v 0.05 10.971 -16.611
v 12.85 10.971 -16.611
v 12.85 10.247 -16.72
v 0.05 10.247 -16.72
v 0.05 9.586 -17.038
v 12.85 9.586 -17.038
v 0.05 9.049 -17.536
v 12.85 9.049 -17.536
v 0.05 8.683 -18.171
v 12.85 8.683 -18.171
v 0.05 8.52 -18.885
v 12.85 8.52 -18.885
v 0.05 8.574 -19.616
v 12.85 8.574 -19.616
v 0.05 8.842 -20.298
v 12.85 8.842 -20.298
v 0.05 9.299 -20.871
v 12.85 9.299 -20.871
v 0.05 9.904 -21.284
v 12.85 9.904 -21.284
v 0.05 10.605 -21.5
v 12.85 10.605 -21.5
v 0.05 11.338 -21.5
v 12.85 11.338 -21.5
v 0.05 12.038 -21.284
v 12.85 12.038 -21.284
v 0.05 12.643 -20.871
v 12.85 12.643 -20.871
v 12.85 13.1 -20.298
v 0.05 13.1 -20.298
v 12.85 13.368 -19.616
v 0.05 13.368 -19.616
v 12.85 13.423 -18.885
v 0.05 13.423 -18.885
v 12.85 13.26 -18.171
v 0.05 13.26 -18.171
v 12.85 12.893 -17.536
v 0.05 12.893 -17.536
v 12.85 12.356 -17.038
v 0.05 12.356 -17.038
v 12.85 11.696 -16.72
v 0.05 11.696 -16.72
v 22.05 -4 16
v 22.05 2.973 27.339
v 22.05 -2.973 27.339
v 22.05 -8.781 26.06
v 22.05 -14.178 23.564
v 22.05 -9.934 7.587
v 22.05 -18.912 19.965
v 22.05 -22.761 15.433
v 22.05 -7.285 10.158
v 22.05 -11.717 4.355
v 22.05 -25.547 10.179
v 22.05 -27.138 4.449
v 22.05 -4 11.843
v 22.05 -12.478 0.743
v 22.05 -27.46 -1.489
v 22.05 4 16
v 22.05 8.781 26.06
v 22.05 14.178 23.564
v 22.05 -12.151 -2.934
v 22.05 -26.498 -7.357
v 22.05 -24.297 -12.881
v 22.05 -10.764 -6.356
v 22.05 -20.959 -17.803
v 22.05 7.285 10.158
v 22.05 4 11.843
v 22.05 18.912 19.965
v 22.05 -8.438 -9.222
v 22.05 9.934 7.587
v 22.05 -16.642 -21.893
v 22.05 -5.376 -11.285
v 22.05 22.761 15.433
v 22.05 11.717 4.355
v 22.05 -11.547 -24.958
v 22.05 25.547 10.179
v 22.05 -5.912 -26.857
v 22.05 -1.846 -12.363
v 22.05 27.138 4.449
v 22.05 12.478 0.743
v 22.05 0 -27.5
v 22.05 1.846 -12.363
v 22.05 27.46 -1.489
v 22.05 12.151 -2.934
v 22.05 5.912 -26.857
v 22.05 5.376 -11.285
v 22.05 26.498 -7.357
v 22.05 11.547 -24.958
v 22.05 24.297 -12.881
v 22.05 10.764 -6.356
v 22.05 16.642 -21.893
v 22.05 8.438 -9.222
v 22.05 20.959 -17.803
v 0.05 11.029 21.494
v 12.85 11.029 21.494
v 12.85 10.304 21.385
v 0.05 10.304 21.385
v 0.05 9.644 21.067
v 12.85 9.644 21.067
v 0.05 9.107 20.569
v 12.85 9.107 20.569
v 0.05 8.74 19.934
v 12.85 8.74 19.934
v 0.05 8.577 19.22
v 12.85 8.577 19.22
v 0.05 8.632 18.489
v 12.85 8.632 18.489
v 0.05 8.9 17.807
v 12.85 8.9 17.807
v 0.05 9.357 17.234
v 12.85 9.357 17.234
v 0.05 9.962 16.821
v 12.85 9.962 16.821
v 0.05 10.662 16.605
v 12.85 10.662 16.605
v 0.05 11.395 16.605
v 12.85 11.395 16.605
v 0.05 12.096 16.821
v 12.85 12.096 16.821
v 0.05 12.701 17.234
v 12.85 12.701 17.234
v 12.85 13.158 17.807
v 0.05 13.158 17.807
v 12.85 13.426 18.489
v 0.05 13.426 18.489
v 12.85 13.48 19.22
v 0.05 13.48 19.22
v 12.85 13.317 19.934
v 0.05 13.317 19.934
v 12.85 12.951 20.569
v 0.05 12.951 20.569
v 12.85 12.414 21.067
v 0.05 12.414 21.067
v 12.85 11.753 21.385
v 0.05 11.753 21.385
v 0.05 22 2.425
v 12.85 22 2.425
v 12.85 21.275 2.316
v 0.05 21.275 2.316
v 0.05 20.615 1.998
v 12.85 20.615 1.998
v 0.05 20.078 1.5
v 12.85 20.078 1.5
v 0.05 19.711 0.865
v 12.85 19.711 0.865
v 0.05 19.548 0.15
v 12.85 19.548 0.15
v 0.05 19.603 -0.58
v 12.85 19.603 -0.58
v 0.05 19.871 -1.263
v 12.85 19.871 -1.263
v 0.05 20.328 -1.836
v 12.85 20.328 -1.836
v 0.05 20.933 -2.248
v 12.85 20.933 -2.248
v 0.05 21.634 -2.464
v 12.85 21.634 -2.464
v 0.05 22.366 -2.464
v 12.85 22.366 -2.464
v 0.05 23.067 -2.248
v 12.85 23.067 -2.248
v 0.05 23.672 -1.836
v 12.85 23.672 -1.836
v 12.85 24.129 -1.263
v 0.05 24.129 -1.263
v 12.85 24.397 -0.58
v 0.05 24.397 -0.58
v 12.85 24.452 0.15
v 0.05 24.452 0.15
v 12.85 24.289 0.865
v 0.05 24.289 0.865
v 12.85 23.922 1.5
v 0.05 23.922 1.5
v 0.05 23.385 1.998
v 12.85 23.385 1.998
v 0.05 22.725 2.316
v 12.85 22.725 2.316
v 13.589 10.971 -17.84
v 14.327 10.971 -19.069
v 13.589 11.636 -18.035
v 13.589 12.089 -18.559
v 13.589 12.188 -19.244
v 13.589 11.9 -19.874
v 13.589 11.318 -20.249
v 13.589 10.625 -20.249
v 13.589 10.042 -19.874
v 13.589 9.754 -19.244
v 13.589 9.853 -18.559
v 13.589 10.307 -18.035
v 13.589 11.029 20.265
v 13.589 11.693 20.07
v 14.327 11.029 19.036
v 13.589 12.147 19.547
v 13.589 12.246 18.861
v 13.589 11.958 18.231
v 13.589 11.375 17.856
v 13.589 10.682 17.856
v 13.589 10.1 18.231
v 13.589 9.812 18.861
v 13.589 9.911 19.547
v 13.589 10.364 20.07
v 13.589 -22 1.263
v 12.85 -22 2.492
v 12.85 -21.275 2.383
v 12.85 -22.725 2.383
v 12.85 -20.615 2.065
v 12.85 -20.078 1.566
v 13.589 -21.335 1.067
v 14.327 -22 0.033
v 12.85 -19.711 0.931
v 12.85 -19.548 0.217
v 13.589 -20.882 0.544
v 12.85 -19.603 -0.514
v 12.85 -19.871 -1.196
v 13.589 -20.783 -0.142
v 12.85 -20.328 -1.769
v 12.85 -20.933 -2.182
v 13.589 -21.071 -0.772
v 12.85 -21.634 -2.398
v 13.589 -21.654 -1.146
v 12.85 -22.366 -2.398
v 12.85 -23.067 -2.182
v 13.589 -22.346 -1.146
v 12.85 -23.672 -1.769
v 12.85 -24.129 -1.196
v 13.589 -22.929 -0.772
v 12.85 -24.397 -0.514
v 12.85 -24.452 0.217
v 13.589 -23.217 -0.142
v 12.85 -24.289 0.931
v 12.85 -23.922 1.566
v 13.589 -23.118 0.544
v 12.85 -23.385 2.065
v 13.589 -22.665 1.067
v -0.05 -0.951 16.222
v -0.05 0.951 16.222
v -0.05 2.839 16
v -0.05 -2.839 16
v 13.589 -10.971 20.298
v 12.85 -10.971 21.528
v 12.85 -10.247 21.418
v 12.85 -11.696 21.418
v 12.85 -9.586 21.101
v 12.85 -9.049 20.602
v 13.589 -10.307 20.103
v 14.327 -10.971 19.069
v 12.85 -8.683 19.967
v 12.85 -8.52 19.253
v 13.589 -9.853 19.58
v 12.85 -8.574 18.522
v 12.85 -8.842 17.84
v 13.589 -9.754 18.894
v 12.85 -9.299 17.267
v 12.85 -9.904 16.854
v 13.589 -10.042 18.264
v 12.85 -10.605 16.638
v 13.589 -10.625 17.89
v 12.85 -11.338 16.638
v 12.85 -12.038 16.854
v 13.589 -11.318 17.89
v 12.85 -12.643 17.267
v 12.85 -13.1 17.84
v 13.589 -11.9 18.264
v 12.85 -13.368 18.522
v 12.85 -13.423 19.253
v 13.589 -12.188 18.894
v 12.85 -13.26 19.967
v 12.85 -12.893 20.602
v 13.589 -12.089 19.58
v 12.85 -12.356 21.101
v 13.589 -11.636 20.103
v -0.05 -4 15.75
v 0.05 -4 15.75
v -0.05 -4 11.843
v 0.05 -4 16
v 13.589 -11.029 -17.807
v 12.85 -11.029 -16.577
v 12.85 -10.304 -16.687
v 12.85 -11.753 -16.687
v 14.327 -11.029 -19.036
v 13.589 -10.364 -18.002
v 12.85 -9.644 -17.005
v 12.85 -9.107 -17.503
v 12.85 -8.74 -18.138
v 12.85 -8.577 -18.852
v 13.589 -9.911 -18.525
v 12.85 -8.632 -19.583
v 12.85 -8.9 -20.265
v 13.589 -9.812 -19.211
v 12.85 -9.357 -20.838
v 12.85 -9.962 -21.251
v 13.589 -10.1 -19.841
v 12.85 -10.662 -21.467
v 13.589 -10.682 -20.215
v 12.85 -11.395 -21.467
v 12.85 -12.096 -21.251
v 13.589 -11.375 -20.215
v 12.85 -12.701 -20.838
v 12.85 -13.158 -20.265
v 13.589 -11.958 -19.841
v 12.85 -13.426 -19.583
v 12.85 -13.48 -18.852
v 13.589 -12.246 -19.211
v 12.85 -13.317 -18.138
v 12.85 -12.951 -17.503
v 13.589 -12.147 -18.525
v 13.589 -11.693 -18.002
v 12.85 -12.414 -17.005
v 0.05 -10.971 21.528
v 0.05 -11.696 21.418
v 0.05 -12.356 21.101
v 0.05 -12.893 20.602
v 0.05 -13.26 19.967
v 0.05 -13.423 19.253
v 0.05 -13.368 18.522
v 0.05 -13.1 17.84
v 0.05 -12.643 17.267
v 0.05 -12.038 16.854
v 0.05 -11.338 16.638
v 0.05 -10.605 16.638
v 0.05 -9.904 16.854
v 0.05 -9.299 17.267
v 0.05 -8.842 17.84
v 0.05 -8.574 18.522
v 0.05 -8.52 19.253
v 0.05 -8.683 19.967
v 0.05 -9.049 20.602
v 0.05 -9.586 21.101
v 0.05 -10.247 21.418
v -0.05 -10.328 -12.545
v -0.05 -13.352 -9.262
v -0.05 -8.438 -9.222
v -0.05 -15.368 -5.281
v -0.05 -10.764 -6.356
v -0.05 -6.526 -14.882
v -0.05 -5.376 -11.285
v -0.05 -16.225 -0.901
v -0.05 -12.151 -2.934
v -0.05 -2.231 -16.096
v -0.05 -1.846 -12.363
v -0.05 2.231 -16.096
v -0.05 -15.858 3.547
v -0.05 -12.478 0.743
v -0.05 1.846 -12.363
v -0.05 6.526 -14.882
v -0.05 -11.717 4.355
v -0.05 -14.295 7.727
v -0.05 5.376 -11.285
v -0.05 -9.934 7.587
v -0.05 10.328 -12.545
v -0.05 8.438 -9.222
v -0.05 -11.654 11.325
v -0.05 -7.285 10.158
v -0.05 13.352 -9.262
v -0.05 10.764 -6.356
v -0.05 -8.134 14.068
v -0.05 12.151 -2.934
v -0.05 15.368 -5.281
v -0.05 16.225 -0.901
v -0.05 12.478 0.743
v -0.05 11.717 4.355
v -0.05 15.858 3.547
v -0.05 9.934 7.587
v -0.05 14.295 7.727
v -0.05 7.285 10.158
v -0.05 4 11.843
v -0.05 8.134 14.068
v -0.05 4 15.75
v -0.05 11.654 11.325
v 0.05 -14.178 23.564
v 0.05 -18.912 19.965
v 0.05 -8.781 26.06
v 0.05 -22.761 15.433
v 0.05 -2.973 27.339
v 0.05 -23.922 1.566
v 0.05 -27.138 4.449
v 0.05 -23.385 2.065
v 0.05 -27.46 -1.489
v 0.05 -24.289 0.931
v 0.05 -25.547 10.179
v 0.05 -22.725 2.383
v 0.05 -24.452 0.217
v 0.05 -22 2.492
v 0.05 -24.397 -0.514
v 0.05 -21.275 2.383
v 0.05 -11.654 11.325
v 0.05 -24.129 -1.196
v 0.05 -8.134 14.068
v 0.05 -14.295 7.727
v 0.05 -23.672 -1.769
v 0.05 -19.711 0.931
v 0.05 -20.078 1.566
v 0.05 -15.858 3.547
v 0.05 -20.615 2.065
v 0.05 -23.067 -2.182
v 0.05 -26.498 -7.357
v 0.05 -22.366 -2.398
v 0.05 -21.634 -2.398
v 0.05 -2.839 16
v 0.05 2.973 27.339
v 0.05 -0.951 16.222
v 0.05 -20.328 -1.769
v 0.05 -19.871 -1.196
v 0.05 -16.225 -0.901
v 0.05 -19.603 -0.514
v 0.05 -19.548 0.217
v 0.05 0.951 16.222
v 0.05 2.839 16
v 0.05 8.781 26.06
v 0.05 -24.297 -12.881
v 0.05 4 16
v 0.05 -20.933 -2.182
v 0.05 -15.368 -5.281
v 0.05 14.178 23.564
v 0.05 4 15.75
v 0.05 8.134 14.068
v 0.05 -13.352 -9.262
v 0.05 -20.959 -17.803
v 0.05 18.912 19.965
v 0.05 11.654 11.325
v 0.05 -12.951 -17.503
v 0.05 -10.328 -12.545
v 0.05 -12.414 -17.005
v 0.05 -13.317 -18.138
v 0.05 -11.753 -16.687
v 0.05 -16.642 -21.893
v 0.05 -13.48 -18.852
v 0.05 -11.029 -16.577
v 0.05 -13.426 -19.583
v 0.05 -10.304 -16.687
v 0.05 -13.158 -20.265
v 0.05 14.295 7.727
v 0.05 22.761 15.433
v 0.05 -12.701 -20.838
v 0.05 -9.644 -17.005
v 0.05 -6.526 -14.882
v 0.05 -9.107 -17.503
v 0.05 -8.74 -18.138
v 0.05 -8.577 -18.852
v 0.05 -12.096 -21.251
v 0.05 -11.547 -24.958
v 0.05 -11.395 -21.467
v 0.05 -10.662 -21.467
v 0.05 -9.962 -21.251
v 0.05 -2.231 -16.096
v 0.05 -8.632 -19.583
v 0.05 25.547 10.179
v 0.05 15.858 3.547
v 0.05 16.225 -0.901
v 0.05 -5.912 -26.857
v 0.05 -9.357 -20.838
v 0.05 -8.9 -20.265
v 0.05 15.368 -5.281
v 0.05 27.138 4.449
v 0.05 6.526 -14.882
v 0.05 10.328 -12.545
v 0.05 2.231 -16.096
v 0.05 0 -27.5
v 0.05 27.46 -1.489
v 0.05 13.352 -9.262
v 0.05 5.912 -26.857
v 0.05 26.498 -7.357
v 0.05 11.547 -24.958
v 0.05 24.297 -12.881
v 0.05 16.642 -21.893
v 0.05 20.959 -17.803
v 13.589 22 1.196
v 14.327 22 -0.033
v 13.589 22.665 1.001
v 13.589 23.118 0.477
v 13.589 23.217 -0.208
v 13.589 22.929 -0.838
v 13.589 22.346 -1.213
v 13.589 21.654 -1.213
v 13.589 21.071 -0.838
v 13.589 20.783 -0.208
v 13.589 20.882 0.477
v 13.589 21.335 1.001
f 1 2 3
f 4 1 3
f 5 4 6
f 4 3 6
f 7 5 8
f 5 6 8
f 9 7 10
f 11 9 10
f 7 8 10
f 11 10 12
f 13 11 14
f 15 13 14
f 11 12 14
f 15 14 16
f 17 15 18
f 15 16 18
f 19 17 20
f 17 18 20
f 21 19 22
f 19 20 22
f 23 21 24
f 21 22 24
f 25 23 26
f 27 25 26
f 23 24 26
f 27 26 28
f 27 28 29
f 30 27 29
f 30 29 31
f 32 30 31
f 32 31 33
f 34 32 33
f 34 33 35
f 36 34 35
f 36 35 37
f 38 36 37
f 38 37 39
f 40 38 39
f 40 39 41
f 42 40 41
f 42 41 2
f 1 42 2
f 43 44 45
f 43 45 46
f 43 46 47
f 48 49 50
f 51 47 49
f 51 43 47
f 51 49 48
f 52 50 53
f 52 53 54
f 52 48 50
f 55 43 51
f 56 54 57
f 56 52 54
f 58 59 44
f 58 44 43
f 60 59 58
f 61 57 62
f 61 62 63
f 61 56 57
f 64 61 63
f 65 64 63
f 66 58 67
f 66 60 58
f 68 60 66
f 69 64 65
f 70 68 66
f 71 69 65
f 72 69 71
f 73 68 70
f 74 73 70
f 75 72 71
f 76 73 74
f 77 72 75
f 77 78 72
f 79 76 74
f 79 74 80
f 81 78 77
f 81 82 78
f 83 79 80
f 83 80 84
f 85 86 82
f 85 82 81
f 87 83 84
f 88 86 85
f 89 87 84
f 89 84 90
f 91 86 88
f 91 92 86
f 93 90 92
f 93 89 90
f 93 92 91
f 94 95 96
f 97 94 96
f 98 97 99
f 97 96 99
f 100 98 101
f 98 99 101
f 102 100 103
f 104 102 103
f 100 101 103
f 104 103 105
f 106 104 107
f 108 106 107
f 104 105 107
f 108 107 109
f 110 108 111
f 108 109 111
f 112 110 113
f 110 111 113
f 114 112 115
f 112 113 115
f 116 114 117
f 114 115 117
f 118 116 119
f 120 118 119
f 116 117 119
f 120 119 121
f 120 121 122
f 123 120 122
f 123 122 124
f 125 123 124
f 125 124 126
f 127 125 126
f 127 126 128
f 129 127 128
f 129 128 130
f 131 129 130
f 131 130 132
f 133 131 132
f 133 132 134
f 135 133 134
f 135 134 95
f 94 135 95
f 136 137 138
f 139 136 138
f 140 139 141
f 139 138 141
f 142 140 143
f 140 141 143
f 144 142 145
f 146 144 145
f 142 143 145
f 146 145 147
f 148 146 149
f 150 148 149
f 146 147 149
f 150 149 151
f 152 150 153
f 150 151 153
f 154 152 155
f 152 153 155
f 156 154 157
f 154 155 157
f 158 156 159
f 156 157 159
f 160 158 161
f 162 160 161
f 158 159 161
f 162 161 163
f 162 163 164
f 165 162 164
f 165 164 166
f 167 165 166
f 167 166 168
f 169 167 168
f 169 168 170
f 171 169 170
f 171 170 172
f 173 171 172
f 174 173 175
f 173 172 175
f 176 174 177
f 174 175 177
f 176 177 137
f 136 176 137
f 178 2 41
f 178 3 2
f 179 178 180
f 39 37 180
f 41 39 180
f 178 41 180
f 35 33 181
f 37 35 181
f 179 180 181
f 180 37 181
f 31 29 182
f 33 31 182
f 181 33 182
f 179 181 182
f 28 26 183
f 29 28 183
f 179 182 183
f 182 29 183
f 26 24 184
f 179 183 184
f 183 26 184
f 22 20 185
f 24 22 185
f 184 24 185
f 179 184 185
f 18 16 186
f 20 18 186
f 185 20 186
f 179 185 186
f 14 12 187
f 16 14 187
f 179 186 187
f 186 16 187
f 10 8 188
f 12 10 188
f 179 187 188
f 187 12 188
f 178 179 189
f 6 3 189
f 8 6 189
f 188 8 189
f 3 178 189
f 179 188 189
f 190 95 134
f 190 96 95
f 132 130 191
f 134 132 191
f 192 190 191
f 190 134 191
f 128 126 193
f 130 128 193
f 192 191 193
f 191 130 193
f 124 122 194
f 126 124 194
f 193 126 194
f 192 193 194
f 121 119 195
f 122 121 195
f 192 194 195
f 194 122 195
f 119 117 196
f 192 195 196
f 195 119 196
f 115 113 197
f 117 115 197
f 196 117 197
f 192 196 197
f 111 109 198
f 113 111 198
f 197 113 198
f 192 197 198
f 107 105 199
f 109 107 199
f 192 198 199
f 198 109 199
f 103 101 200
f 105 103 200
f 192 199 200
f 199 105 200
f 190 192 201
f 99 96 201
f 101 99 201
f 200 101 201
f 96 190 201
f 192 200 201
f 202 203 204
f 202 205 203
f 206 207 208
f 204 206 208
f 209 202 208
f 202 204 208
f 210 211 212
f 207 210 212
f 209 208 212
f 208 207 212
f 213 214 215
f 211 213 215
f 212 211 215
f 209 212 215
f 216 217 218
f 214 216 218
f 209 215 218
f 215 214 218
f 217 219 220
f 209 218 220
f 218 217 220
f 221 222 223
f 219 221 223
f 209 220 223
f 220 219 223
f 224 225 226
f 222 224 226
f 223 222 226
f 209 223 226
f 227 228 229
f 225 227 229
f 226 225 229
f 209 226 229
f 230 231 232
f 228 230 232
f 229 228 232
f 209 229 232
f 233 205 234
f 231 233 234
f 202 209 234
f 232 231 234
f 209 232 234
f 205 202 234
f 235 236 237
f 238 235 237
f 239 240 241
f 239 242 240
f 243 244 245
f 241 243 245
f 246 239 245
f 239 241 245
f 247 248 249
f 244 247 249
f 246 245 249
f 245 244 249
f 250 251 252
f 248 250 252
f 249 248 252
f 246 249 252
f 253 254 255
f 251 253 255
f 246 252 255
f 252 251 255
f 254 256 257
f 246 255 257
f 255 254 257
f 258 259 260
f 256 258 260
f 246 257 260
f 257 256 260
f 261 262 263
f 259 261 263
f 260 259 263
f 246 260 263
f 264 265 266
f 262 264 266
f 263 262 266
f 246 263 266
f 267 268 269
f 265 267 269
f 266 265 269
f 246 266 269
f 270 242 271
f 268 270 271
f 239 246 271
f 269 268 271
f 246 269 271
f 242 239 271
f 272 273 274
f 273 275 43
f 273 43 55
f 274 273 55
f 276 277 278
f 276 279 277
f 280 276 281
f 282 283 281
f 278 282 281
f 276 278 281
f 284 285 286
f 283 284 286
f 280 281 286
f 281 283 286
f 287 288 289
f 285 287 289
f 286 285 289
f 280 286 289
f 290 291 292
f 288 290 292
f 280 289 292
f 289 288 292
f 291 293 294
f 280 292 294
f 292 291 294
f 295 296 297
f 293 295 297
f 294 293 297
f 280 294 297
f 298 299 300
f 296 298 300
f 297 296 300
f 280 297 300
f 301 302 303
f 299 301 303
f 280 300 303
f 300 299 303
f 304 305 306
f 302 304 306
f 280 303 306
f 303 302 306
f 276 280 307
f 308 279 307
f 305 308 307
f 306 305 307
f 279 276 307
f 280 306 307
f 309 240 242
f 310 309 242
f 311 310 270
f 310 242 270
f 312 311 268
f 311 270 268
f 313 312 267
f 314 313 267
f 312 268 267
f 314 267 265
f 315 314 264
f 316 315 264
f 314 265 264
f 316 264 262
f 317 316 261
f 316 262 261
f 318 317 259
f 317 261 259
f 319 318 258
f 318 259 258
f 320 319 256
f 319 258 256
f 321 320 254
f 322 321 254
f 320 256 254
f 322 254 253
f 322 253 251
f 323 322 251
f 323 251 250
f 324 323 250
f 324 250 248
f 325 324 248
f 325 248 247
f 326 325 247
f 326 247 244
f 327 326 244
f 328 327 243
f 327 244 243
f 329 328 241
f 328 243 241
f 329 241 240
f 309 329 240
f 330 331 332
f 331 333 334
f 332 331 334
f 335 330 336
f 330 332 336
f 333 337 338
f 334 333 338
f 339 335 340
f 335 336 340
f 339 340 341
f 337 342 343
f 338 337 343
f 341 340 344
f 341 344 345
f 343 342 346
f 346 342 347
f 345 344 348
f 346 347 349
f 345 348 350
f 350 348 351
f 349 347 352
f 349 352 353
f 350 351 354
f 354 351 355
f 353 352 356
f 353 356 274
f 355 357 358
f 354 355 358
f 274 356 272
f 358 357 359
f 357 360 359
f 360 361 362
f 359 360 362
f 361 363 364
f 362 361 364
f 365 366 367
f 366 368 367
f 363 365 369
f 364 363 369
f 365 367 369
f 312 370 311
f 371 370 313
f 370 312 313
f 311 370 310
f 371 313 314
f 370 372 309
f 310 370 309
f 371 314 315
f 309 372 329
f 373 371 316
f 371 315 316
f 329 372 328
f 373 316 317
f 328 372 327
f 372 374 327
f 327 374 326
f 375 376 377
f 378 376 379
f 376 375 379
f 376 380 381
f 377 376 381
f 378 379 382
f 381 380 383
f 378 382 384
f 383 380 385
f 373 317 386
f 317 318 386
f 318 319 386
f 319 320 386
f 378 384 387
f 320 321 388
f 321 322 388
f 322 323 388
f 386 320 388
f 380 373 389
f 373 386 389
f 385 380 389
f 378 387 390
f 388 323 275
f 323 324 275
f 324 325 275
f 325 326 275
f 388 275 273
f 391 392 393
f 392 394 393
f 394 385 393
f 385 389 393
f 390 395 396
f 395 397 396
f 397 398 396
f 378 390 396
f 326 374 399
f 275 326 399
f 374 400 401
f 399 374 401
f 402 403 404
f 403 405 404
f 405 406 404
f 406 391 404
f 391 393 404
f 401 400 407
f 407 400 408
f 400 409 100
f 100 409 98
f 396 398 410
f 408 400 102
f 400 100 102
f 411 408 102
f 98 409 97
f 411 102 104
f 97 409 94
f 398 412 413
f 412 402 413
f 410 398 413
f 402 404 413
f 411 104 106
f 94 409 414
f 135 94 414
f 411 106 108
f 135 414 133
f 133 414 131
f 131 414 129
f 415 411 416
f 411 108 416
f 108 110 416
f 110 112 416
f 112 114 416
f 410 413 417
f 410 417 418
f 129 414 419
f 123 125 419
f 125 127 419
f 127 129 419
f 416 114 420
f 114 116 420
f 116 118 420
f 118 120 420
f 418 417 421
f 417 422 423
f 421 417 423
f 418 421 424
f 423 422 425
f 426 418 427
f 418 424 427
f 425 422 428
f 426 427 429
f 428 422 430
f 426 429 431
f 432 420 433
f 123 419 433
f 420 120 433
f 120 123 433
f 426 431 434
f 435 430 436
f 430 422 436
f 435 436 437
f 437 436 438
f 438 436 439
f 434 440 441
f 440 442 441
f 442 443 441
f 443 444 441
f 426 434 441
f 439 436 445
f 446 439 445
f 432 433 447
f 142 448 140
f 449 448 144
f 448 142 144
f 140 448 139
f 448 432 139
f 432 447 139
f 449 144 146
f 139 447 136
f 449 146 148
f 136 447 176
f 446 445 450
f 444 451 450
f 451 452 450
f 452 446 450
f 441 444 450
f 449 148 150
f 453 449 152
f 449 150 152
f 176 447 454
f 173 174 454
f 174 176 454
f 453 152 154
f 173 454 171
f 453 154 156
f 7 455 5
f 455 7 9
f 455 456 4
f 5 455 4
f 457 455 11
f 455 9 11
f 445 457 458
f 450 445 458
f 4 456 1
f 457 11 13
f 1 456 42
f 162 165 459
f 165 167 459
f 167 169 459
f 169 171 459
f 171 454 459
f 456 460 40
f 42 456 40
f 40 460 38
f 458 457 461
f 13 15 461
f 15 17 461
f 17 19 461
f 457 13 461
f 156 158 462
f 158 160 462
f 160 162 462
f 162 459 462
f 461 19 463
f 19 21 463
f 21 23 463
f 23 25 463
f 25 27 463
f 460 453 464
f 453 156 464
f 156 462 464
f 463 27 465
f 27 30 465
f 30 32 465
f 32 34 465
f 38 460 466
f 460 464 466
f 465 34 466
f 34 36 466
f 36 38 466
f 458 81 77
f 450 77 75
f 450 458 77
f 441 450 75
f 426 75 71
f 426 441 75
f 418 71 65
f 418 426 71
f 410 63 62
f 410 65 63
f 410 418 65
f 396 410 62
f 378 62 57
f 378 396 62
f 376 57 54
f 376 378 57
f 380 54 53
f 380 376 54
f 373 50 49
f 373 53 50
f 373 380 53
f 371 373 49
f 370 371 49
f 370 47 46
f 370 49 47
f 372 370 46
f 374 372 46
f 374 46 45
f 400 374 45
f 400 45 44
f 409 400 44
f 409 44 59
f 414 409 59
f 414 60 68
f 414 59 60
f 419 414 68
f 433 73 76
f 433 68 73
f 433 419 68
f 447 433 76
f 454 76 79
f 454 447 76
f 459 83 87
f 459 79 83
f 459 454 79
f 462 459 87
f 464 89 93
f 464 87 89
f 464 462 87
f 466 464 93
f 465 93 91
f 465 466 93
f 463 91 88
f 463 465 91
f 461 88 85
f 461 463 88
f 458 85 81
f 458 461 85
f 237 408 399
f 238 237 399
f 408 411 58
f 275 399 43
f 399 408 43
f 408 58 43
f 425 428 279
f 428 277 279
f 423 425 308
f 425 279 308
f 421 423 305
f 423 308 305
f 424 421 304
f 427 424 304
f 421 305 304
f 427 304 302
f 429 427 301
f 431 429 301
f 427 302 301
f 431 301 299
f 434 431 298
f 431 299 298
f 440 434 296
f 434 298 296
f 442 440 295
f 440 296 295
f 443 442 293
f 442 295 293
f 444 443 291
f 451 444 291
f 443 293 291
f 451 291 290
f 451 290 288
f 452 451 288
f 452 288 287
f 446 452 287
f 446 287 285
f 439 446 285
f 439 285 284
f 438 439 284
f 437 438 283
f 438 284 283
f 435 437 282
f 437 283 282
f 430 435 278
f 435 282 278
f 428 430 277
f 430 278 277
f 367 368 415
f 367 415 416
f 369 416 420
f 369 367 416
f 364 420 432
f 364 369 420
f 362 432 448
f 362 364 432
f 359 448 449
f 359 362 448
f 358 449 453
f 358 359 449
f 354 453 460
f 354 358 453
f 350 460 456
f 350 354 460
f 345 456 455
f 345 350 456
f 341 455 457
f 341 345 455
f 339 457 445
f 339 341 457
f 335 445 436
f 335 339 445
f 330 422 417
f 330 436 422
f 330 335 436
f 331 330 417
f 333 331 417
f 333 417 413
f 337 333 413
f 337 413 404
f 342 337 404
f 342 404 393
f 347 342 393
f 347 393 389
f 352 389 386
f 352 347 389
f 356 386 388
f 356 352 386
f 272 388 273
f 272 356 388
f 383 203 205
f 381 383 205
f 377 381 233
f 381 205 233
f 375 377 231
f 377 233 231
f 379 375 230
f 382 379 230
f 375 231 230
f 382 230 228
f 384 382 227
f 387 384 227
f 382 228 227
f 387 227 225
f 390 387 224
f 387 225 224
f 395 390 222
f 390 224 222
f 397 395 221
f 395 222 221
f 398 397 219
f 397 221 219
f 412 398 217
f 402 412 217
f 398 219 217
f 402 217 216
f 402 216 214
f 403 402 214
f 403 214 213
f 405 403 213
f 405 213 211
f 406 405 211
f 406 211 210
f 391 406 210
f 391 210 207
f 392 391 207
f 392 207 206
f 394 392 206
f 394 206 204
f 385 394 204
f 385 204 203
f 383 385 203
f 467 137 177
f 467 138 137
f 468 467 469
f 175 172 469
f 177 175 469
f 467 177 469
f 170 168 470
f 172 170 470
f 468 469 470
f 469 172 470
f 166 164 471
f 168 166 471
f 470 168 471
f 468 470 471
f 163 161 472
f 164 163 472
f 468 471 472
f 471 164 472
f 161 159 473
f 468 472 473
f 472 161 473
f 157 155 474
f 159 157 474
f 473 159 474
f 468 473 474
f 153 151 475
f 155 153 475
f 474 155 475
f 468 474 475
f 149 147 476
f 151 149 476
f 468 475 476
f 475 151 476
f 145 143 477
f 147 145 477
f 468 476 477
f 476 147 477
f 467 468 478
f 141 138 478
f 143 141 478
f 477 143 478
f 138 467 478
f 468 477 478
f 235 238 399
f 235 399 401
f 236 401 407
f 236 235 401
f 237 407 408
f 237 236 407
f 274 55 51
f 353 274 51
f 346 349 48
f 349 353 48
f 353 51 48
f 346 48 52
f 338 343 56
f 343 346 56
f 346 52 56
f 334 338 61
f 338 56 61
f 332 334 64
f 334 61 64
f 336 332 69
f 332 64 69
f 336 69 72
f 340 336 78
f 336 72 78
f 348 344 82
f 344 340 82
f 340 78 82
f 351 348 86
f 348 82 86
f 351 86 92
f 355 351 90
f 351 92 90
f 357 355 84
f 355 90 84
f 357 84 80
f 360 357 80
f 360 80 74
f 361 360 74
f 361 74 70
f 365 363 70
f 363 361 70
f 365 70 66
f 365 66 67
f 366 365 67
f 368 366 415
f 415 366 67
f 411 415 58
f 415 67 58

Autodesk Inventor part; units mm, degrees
ref_plane "YZ Plane" through (0, 0, 0) normal (1, 0, 0) x (0, 1, 0)
ref_plane "XZ Plane" through (0, 0, 0) normal (0, 1, 0) x (-1, 0, 0)
ref_plane "XY Plane" through (0, 0, 0) normal (0, 0, 1) x (1, 0, 0)
sketch "Skizze1" plane through (0, 0, 0) normal (1, 0, 0) x (0, 1, 0)
  circle A0 centre (0, 0) radius 12.5
  circle A1 centre (0, 0) radius 16.25
  dimension "d0" = 25
  dimension "d1" = 32.5
extrude "Extrusion1" add sketch "Skizze1" along normal mid plane 0.1
sketch "Skizze2" plane through (0.05, 0, 0) normal (1, 0, 0) x (0, 0, -1)
  circle A0 centre (0, 0) radius 27.5
  dimension "d5" = 55
extrude "Extrusion2" add sketch "Skizze2" along normal blind 22
sketch "Skizze4" plane through (22.05, 0, 0) normal (1, 0, 0) x (0, 0, -1)
  circle A0 centre (0, 0) radius 12.5
  dimension "d8" = 25
extrude "Extrusion3" cut sketch "Skizze4" against normal blind 30
sketch "Skizze5" plane through (0.05, 0, 0) normal (-1, 0, 0) x (0, 0, 1)
  point P0 (0, 0)
  point P1 (0.0333, -22)
  point P2 (19.0692, -10.9712)
  point P3 (19.0359, 11.0288)
  point P4 (-0.0333, 22)
  point P5 (-19.0692, 10.9712)
  point P6 (-19.0359, -11.0288)
  dimension "d18" = 22
  dimension "d21" = 360
hole "Bohrung1" at (0.05, -22, 0.0333) at (0.05, -10.9712, 19.0692) at (0.05, 11.0288, 19.0359) at (0.05, 22, -0.0333) at (0.05, 10.9712, -19.0692) at (0.05, -11.0288, -19.0359) direction (1, 0, 0) diameter 4.917 depth 12.8 tip angle 118 thread size "M6x1" class "6H" standard "ISO Metric profile"
sketch "Skizze6" plane through (22.05, 0, 0) normal (1, 0, 0) x (0, 0, -1)
  line L0 (-16, -4) -> (-9, -4)
  line L1 (-9, -4) -> (-9, 4)
  line L2 (-9, 4) -> (-16, 4)
  line L3 (-16, 4) -> (-16, -4)
  circle A0 centre (0, 0) radius 12.5 projected
  line L4 (-16, -4) -> (-9, 4) construction
  line L5 (-9, -4) -> (-16, 4) construction
  point P0 (-12.5, 0)
  point P1 (-11.8427, -4)
  point P2 (-11.8427, 4)
  dimension "d23" = 7
  dimension "d24" = 8
  dimension "d25" = 9
extrude "Extrusion4" cut sketch "Skizze6" against normal blind 52 contours L3 L2 A0 L0
properties part number "Befestigung bremsscheibe"
